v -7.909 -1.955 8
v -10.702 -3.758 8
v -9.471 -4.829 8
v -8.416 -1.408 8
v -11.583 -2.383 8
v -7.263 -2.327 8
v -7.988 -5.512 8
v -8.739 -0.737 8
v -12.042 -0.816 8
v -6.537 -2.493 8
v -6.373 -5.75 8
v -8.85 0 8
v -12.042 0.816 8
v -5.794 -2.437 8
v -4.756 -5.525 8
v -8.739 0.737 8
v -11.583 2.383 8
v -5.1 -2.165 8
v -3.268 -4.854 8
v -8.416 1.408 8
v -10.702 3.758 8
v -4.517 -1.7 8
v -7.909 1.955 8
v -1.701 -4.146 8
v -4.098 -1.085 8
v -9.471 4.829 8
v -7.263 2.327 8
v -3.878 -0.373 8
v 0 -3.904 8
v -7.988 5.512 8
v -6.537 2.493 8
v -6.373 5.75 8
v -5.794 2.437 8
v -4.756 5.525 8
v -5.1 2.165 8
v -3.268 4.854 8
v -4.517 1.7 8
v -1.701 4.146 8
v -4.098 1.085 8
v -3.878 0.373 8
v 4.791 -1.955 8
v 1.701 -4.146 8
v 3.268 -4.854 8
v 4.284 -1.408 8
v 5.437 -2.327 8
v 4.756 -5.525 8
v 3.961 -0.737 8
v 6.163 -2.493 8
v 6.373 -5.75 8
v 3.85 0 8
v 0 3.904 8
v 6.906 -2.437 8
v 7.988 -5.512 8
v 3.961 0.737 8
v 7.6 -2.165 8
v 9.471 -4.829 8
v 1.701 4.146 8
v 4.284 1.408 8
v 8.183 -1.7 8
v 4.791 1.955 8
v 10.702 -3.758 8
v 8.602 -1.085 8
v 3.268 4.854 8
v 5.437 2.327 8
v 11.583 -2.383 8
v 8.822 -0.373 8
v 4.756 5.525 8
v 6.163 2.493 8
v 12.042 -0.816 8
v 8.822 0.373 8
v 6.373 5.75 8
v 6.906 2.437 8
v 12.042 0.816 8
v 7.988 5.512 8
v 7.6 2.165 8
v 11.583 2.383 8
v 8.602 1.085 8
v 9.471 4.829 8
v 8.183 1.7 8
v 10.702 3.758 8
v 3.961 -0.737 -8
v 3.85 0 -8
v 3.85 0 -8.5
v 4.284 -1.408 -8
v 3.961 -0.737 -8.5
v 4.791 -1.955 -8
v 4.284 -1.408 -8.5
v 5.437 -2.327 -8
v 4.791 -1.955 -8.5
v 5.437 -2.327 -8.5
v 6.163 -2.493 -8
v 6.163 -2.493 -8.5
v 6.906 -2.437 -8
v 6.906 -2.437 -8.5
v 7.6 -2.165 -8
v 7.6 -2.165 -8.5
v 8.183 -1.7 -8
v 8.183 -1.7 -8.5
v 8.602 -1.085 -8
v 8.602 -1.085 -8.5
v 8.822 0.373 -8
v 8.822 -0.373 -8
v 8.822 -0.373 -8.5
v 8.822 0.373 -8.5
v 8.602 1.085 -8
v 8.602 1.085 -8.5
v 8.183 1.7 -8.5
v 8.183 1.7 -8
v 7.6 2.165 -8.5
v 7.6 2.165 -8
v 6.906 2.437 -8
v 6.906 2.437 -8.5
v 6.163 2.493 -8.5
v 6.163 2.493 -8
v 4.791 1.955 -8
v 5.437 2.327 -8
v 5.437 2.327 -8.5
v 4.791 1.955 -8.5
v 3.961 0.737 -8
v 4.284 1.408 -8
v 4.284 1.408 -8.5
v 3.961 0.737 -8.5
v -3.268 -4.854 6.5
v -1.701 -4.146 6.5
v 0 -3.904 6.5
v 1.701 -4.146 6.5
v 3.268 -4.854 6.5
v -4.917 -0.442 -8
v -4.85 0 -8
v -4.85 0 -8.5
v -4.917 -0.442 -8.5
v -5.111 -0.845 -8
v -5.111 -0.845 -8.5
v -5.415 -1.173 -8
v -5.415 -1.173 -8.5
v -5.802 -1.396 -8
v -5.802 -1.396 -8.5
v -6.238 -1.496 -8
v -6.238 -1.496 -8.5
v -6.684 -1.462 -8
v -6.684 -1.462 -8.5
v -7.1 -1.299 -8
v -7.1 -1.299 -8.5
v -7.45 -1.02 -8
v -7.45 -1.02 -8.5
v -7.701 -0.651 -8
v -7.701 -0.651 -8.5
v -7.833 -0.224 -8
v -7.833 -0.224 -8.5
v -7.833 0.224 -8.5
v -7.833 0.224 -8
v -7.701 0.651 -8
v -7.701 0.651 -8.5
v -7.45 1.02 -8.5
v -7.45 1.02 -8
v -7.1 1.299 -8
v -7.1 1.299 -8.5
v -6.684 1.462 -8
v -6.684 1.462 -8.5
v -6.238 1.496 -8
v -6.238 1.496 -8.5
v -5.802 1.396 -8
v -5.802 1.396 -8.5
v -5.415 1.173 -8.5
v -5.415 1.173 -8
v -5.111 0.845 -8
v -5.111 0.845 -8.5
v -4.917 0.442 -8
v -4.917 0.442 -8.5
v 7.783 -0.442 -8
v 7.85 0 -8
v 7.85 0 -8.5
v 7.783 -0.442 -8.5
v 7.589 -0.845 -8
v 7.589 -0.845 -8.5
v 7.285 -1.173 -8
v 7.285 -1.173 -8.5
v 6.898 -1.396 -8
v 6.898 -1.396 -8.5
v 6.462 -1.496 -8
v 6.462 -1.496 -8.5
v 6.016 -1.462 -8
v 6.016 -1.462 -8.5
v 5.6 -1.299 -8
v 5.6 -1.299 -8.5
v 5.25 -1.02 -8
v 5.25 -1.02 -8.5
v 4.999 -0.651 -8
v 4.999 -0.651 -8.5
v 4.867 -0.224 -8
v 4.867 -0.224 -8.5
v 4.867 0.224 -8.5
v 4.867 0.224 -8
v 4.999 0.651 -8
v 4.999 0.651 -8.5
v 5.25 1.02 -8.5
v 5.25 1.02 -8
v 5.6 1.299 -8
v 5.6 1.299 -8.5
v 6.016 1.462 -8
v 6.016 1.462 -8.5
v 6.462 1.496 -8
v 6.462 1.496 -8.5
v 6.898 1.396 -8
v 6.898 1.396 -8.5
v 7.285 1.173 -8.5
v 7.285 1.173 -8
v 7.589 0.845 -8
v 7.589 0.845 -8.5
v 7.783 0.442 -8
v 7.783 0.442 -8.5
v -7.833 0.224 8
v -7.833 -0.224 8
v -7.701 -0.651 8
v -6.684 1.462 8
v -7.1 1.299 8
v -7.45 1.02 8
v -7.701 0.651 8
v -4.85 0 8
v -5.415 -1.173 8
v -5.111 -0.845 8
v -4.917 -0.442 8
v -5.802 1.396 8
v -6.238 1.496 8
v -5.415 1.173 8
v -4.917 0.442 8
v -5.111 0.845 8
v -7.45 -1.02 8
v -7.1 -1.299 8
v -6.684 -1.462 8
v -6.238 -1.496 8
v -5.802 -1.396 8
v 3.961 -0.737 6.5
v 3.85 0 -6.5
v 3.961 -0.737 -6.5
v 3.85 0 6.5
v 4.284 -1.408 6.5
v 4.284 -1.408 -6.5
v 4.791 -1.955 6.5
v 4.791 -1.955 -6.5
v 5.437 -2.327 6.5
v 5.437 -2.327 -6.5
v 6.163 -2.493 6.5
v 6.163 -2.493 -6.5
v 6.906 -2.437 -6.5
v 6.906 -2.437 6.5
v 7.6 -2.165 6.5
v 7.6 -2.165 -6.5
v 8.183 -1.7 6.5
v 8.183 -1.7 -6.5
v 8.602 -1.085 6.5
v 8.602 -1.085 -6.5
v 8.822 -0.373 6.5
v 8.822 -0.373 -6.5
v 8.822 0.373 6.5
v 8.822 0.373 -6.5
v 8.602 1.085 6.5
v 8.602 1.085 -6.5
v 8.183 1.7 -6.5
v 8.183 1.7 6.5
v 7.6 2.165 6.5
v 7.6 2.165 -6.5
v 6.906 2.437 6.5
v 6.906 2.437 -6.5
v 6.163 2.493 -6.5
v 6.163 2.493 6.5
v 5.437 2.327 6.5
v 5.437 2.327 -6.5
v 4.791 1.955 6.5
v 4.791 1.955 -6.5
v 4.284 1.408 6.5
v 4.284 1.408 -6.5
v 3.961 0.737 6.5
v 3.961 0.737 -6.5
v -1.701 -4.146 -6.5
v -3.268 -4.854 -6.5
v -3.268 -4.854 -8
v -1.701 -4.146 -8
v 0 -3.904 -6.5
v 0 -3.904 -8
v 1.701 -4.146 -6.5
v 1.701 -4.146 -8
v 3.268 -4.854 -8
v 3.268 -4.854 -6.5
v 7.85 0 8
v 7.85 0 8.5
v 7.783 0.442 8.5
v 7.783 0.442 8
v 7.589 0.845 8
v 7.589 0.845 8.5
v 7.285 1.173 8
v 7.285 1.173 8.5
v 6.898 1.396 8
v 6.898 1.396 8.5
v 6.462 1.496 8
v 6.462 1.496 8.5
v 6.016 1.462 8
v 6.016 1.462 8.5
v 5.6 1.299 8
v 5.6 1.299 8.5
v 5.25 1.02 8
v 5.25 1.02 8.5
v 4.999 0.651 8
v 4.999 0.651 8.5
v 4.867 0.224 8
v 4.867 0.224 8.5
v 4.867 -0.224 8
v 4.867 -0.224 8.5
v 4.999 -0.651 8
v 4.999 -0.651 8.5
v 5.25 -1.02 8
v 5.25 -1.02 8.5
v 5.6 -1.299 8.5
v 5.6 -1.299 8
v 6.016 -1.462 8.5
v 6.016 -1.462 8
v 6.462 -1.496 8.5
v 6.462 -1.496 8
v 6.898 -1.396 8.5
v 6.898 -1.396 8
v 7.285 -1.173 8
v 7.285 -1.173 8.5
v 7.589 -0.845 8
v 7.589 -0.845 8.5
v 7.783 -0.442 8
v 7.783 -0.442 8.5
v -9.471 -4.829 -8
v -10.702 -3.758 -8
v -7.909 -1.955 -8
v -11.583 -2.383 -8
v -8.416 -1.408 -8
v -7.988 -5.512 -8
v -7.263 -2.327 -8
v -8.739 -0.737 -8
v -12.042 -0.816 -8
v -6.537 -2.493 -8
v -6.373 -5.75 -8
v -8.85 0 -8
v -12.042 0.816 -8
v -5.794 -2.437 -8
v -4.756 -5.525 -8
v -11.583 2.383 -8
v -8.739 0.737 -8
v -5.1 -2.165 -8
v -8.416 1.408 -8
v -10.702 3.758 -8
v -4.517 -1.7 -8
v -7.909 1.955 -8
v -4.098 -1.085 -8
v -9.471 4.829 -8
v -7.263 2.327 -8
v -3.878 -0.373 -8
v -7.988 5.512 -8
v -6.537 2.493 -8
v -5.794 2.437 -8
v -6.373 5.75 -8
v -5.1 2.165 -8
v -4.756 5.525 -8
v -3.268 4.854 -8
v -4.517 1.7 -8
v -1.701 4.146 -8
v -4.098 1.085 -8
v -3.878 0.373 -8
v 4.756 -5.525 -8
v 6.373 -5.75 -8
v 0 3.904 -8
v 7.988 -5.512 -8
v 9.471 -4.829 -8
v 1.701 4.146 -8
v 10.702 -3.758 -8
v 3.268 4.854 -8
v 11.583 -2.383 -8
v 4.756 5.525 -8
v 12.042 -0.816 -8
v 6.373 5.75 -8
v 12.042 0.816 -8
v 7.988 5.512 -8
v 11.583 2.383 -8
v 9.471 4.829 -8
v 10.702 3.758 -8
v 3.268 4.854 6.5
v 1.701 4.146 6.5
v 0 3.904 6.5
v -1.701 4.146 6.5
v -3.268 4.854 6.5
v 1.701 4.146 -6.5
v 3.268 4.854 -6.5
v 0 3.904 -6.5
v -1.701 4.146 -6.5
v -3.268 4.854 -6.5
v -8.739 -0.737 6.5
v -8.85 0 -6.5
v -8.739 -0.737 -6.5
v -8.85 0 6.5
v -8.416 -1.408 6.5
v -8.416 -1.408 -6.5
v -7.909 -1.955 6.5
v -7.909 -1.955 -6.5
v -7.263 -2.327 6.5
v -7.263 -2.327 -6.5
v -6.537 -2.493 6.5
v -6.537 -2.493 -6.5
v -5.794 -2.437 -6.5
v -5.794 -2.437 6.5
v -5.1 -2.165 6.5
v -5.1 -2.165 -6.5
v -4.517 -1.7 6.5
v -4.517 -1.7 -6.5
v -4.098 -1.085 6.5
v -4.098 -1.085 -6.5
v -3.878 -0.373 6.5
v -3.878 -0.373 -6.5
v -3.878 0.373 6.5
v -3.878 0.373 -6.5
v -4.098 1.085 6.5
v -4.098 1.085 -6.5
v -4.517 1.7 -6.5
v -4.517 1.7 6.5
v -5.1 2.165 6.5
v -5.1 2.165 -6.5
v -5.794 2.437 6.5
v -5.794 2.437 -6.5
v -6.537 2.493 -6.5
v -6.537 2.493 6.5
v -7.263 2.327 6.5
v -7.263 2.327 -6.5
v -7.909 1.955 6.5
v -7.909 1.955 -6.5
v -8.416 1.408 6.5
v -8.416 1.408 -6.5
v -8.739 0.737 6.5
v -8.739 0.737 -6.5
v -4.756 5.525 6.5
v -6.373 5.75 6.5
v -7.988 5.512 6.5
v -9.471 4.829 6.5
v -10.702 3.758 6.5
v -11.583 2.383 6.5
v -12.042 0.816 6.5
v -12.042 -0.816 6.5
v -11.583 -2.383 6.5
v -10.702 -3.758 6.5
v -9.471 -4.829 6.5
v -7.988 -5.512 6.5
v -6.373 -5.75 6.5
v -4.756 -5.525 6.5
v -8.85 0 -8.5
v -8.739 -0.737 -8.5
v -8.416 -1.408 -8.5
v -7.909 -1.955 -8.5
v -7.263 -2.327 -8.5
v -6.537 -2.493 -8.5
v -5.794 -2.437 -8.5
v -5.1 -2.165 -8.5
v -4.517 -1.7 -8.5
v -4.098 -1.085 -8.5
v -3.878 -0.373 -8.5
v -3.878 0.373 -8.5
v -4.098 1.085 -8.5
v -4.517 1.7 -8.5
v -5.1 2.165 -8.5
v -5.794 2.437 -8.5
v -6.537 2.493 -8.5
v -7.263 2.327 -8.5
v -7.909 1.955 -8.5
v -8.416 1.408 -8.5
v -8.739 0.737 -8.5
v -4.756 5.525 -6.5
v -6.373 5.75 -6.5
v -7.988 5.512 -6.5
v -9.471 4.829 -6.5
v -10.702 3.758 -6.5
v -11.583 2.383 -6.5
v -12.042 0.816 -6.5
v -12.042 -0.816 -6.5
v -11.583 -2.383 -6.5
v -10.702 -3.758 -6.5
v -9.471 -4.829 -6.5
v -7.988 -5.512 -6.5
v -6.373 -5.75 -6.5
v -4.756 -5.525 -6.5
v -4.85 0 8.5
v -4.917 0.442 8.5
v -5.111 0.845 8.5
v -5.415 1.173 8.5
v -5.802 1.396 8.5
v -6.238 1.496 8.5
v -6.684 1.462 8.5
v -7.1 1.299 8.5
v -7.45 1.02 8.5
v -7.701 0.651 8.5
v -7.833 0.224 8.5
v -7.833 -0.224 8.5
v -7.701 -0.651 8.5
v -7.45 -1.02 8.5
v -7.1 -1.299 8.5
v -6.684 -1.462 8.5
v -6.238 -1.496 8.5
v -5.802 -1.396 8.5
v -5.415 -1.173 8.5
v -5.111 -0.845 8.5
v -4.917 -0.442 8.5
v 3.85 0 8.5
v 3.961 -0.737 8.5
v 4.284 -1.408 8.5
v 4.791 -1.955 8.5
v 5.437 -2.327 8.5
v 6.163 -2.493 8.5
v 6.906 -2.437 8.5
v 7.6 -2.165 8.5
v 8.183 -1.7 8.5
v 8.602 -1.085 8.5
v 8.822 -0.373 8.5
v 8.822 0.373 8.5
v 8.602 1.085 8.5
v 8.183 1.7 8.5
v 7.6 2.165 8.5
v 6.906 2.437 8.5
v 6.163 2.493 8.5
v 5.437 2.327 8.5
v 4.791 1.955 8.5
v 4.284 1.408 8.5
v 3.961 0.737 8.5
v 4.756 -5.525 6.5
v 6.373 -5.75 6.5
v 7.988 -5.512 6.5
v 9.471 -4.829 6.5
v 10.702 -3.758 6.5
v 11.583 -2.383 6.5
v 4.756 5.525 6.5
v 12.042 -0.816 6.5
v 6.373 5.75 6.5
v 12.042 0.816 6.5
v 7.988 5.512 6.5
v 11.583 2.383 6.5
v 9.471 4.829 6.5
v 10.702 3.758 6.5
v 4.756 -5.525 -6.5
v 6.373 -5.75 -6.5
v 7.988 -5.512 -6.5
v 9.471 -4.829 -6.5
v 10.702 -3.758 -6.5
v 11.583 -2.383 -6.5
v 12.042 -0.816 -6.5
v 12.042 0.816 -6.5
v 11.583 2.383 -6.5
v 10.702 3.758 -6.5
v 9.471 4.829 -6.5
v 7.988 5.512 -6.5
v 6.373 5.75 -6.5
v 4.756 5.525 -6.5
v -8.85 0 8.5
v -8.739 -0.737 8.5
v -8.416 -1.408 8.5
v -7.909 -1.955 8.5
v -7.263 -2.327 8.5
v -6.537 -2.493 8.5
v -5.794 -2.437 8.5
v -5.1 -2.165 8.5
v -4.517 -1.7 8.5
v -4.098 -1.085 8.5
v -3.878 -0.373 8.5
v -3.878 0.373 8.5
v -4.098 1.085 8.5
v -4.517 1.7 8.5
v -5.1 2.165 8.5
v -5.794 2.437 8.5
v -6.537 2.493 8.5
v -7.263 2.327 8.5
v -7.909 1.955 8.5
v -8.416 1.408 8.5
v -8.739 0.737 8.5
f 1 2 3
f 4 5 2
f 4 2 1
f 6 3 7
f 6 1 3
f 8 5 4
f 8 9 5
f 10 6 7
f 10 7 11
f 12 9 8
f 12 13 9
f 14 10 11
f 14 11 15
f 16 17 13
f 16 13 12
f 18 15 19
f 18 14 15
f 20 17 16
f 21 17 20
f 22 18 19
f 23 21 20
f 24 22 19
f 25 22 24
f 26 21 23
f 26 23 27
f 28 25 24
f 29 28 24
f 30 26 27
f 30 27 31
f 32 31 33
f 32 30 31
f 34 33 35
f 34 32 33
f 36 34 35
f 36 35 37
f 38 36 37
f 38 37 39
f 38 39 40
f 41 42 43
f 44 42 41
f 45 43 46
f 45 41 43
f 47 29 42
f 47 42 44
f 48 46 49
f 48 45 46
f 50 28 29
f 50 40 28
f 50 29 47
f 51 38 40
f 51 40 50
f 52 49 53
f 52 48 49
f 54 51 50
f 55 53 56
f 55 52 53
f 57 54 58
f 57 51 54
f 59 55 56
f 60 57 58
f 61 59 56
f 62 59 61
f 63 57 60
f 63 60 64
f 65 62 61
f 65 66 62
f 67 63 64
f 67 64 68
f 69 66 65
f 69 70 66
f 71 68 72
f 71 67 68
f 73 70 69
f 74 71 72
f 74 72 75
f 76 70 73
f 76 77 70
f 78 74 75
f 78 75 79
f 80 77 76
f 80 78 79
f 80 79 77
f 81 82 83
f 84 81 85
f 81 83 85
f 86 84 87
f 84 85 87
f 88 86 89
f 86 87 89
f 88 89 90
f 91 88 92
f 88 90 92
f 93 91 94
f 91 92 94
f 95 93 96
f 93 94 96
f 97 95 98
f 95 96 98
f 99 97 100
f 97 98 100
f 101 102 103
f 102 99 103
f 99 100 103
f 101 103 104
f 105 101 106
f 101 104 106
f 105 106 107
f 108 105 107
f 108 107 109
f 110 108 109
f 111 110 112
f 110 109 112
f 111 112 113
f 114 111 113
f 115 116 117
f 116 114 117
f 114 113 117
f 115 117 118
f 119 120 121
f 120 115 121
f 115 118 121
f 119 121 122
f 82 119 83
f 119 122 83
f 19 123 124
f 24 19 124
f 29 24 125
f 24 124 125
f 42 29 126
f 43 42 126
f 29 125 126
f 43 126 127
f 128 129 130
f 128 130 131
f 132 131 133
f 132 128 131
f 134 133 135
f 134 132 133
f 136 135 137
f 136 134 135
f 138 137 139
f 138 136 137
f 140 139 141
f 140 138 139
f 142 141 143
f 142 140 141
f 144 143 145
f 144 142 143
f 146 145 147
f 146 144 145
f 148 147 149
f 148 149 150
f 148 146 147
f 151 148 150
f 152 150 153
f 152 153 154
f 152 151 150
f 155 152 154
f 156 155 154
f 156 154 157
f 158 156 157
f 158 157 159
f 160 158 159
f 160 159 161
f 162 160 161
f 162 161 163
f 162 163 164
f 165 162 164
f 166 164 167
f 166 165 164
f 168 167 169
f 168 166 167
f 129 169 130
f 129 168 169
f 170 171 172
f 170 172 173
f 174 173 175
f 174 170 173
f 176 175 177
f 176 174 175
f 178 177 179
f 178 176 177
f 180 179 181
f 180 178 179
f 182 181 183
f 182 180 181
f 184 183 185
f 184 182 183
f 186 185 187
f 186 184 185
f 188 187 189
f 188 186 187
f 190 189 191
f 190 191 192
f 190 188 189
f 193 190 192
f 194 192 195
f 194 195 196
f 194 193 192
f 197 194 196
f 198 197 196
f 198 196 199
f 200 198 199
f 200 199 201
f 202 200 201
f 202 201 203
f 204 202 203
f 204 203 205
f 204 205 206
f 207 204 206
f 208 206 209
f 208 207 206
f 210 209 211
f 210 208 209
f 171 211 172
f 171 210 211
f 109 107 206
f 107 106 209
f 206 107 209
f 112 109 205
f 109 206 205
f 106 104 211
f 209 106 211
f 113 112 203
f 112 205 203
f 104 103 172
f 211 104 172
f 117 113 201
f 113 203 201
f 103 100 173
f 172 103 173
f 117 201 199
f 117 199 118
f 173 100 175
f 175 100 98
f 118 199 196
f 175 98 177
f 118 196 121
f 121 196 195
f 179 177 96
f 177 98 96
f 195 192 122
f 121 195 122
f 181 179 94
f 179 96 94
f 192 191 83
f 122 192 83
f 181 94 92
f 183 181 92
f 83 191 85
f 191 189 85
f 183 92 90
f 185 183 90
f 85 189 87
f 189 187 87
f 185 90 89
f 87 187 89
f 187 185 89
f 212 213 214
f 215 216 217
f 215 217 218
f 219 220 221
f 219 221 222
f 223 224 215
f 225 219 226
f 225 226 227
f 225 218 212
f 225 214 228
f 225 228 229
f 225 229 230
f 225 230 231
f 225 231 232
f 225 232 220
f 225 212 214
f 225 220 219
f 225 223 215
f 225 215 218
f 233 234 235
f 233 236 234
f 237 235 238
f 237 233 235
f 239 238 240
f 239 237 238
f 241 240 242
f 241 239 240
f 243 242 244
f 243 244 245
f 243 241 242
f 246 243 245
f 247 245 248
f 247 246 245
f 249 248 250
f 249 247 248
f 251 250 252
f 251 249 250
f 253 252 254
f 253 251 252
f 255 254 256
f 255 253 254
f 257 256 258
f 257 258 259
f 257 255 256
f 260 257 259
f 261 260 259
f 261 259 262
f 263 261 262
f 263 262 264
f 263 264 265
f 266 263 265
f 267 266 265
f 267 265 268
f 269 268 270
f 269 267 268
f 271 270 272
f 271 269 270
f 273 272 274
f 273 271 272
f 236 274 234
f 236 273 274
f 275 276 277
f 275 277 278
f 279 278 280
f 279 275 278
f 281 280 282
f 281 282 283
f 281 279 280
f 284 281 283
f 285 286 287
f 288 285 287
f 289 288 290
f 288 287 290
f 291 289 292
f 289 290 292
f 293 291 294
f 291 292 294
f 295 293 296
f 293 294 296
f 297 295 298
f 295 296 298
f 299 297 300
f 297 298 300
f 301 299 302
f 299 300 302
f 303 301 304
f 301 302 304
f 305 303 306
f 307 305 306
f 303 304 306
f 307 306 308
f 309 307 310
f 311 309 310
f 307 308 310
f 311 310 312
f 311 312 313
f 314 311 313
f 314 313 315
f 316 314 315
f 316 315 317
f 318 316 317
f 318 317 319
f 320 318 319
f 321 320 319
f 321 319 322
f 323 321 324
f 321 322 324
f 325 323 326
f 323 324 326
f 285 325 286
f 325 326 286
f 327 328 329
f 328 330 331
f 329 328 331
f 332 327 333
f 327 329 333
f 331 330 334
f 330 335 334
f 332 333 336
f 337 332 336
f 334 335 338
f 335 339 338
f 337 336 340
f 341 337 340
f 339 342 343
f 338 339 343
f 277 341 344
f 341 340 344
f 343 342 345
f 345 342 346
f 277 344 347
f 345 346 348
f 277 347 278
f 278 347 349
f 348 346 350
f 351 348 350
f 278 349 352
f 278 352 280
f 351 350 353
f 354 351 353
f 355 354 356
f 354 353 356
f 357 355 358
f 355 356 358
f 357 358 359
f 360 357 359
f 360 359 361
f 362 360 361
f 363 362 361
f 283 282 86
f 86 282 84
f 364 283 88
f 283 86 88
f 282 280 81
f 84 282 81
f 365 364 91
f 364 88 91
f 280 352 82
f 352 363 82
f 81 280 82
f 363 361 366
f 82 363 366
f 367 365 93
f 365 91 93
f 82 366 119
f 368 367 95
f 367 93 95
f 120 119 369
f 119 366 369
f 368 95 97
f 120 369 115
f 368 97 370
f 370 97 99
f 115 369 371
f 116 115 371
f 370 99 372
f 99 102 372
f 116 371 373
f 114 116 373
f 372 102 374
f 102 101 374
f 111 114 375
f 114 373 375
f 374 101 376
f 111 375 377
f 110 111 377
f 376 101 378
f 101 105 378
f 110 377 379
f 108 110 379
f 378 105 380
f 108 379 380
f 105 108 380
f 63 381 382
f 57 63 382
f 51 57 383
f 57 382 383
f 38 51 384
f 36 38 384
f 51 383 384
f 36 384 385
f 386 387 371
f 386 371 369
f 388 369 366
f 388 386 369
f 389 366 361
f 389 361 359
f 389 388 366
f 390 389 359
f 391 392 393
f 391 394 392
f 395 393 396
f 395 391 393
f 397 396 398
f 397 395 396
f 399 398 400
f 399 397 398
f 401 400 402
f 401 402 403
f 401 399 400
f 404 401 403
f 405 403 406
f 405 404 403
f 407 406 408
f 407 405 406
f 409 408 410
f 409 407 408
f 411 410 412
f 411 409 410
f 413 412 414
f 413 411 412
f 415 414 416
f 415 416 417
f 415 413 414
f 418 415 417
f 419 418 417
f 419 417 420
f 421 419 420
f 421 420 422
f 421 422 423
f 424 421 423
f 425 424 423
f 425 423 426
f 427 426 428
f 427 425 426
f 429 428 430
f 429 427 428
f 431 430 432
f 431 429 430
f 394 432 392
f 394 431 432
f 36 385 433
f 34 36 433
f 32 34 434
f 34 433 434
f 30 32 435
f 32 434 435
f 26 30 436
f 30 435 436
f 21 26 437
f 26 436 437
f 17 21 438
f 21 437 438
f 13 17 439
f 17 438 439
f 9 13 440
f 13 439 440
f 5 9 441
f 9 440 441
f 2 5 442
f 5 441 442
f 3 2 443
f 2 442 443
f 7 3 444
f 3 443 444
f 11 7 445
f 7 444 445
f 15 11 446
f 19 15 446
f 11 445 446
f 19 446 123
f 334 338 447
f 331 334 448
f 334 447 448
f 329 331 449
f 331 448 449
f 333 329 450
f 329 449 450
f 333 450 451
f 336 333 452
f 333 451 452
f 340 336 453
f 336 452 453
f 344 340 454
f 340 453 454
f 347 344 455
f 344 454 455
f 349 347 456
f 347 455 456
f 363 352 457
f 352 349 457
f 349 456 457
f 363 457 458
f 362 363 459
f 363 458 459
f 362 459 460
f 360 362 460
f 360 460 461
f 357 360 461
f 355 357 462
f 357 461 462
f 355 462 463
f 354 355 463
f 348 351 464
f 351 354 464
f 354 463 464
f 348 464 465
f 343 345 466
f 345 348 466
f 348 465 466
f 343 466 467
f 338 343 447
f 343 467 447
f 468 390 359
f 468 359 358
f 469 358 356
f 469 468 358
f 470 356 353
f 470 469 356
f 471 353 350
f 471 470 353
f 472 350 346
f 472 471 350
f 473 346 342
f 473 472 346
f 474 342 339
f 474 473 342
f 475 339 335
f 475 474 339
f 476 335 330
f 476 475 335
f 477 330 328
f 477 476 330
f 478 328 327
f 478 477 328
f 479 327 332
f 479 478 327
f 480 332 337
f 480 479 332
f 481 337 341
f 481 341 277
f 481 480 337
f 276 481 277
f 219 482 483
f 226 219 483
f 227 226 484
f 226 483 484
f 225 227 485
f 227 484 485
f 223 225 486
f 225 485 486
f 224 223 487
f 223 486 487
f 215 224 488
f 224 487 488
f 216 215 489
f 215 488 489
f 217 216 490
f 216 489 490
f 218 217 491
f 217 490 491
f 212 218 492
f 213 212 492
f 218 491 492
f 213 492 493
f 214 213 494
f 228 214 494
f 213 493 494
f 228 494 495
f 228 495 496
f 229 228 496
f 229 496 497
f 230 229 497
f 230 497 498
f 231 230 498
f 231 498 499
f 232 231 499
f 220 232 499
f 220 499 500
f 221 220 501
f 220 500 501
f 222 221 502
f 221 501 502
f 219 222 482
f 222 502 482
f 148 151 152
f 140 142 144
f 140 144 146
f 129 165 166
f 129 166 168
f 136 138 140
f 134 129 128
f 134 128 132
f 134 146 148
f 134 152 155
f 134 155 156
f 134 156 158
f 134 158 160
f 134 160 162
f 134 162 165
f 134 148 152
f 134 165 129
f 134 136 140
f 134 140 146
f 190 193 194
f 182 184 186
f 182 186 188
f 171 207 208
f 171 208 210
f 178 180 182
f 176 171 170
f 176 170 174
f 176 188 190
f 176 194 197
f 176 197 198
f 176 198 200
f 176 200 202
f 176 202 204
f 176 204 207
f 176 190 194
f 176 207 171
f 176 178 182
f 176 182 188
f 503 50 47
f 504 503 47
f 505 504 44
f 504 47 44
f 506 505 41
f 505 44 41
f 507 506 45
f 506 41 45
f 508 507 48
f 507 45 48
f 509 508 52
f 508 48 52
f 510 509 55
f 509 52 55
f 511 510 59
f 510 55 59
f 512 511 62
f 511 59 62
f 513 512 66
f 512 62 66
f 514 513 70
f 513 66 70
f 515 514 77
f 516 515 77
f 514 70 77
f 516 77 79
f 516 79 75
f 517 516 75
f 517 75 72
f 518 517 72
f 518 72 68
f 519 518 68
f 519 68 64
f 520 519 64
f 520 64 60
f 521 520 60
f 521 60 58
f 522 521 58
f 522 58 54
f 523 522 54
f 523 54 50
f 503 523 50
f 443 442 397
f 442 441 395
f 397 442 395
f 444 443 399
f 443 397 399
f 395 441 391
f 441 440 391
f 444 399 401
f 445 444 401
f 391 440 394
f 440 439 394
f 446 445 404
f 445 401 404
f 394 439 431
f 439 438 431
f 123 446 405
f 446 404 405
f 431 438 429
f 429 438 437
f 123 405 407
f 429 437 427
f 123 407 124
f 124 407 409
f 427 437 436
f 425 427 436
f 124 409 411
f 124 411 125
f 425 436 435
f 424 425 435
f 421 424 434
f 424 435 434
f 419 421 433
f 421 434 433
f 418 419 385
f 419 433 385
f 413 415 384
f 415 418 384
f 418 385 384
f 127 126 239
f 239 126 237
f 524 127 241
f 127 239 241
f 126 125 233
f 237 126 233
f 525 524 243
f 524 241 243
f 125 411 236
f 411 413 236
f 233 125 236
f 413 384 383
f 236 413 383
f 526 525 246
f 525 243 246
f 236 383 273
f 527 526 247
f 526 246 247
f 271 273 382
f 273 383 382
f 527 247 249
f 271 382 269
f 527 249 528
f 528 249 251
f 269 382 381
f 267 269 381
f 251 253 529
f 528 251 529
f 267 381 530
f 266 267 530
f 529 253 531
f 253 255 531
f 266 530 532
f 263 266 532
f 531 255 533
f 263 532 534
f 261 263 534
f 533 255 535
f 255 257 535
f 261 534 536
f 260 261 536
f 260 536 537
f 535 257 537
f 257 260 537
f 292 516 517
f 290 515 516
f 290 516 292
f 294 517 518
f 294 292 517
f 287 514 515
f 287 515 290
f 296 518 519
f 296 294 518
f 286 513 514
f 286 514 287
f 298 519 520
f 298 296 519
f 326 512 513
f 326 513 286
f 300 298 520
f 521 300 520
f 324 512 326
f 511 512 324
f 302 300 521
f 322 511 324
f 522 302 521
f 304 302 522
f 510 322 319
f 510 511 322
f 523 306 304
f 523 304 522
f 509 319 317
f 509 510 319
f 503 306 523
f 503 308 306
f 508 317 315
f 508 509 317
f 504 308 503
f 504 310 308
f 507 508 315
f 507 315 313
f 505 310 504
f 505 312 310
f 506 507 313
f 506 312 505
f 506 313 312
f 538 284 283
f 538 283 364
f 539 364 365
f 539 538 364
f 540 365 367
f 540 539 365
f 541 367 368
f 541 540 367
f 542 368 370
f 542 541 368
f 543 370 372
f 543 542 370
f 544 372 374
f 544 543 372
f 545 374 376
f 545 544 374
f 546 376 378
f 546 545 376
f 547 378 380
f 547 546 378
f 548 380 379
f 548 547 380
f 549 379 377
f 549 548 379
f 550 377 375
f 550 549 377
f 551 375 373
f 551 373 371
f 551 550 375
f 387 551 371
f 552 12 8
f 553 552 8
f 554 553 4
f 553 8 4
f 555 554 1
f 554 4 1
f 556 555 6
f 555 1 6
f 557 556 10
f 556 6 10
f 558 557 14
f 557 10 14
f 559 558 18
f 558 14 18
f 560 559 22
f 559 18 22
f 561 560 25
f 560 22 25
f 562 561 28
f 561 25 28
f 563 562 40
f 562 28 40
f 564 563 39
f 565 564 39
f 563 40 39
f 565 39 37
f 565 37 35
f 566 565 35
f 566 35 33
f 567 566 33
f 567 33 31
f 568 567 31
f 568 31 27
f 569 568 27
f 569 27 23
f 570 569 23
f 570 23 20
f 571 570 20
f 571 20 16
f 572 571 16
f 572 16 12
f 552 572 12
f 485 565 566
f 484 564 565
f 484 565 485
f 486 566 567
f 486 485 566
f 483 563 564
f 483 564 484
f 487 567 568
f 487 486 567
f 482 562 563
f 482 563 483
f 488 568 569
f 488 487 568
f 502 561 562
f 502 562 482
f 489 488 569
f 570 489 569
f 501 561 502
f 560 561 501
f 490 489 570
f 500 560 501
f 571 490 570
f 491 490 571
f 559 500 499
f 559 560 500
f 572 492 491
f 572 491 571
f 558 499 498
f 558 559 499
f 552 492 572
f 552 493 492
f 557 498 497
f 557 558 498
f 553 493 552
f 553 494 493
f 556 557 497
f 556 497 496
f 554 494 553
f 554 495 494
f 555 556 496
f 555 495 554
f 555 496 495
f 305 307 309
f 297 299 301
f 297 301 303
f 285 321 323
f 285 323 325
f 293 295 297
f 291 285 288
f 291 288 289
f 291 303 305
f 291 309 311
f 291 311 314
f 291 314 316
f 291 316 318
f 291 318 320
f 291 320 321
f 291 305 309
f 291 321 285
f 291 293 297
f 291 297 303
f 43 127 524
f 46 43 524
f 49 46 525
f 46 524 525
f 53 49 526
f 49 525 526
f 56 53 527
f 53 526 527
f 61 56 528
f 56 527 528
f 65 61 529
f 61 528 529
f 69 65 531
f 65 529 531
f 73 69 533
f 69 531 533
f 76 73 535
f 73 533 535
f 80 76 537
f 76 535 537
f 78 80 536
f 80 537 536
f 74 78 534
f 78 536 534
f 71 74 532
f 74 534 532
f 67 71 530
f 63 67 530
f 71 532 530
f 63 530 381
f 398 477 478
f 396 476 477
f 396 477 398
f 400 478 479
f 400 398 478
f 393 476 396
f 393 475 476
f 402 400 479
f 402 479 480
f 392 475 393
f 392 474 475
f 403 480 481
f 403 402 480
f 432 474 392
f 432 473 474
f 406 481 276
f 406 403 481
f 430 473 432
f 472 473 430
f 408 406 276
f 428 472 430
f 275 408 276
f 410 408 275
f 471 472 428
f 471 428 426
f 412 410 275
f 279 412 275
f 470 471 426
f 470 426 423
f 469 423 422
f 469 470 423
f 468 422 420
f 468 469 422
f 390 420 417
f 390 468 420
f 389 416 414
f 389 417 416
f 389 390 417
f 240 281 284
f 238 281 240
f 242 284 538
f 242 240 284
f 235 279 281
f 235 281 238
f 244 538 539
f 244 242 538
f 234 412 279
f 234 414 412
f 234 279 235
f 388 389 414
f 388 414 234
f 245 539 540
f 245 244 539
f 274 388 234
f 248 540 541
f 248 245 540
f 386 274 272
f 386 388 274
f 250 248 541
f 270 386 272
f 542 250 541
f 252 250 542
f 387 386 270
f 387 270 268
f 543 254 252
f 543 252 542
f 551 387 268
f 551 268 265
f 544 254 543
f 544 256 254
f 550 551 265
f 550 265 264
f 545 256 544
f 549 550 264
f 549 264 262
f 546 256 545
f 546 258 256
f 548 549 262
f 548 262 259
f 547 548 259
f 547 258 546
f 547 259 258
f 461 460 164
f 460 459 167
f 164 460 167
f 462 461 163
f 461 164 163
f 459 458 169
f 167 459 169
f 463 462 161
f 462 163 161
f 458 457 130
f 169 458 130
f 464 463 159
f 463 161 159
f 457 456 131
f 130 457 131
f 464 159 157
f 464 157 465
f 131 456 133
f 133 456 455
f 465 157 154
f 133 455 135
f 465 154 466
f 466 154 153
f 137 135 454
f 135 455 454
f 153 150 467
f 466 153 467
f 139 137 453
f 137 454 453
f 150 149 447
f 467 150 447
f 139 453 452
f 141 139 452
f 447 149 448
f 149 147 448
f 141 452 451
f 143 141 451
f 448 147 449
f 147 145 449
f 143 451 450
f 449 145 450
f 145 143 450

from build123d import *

# Parameters (mm, degrees)
SKETCH1_R                = 2.5
BOSS_EXTRUDE3_DEPTH      = 6.5
BOSS_EXTRUDE3_2_DEPTH    = 6.5
BOSS_EXTRUDE7_START      = -6.5
BOSS_EXTRUDE7_DEPTH      = 1.5
BOSS_EXTRUDE8_DEPTH      = 8.5
BOSS_EXTRUDE8_DEPTH_BACK = 8.5
SKETCH2_R                = 2.5
SKETCH3_R                = 1.5
CUT_EXTRUDE1_DEPTH       = 0.5
CUT_EXTRUDE2_START       = -0.5
SKETCH4_R                = 1.5
CUT_EXTRUDE2_DEPTH       = 0.5


with BuildPart() as part:
    # Sketch1 → Boss-Extrude3 (new, symmetric)
    with BuildSketch(Plane.XY):
        with Locations(Location((6.35, 0, 0), (0, 0, 180))):
            Circle(SKETCH1_R)
    extrude(amount=BOSS_EXTRUDE3_DEPTH, both=True)



with BuildPart() as body_2:
    # Sketch1 → Boss-Extrude3 2 (new, symmetric)
    with BuildSketch(Plane.XY):
        with Locations(Location((-6.35, 0, 0), (0, 0, 180))):
            Circle(SKETCH1_R)
    extrude(amount=BOSS_EXTRUDE3_2_DEPTH, both=True)


with BuildPart() as part_1:
    add(part.part)

    add(body_2.part)  # Boss-Extrude7 merges body 2
    # Sketch1<5> → Boss-Extrude7 (add)
    with BuildSketch(Plane.XY.offset(BOSS_EXTRUDE7_START)):
        with BuildLine():
            ThreePointArc((-3.267678659, 4.854049356), (-12.1, 0), (-3.267678659, -4.854049356))
            ThreePointArc((-3.267678659, -4.854049356), (0, -3.904220161), (3.267678659, -4.854049356))
            ThreePointArc((3.267678659, -4.854049356), (12.1, 0), (3.267678659, 4.854049356))
            ThreePointArc((3.267678659, 4.854049356), (0, 3.904220161), (-3.267678659, 4.854049356))
        make_face()
    boss_extrude7 = extrude(amount=-BOSS_EXTRUDE7_DEPTH)

    # Mirror1: Boss-Extrude7 across plane
    add(boss_extrude7.mirror(Plane.XY))

    # Sketch2 → Boss-Extrude8 (add, two sides: drawn at the far end of the back side and taken through both)
    with BuildSketch(Plane.XY.offset(-BOSS_EXTRUDE8_DEPTH_BACK)):
        with Locations(Location((-6.35, 0, 0), (0, 0, 180))):
            Circle(SKETCH2_R)
        with Locations(Location((6.35, 0, 0), (0, 0, 180))):
            Circle(SKETCH2_R)
    extrude(amount=BOSS_EXTRUDE8_DEPTH + BOSS_EXTRUDE8_DEPTH_BACK)

    # Sketch3 → Cut-Extrude1 (cut)
    with BuildSketch(Plane.XY.offset(8.5)):
        with Locations((-6.35, 0)):
            Circle(SKETCH3_R)
        with Locations((6.35, 0)):
            Circle(SKETCH3_R)
    extrude(amount=-CUT_EXTRUDE1_DEPTH, mode=Mode.SUBTRACT)

    # Sketch4 → Cut-Extrude2 (cut)
    with BuildSketch(Plane(origin=(0, 0, -8.5), x_dir=(-1, 0, 0), z_dir=(0, 0, -1)).offset(CUT_EXTRUDE2_START)):
        with Locations(Location((6.35, 0, 0), (0, 0, 180))):
            Circle(SKETCH4_R)
        with Locations(Location((-6.35, 0, 0), (0, 0, 180))):
            Circle(SKETCH4_R)
    extrude(amount=CUT_EXTRUDE2_DEPTH, mode=Mode.SUBTRACT)


solid = part_1.part
